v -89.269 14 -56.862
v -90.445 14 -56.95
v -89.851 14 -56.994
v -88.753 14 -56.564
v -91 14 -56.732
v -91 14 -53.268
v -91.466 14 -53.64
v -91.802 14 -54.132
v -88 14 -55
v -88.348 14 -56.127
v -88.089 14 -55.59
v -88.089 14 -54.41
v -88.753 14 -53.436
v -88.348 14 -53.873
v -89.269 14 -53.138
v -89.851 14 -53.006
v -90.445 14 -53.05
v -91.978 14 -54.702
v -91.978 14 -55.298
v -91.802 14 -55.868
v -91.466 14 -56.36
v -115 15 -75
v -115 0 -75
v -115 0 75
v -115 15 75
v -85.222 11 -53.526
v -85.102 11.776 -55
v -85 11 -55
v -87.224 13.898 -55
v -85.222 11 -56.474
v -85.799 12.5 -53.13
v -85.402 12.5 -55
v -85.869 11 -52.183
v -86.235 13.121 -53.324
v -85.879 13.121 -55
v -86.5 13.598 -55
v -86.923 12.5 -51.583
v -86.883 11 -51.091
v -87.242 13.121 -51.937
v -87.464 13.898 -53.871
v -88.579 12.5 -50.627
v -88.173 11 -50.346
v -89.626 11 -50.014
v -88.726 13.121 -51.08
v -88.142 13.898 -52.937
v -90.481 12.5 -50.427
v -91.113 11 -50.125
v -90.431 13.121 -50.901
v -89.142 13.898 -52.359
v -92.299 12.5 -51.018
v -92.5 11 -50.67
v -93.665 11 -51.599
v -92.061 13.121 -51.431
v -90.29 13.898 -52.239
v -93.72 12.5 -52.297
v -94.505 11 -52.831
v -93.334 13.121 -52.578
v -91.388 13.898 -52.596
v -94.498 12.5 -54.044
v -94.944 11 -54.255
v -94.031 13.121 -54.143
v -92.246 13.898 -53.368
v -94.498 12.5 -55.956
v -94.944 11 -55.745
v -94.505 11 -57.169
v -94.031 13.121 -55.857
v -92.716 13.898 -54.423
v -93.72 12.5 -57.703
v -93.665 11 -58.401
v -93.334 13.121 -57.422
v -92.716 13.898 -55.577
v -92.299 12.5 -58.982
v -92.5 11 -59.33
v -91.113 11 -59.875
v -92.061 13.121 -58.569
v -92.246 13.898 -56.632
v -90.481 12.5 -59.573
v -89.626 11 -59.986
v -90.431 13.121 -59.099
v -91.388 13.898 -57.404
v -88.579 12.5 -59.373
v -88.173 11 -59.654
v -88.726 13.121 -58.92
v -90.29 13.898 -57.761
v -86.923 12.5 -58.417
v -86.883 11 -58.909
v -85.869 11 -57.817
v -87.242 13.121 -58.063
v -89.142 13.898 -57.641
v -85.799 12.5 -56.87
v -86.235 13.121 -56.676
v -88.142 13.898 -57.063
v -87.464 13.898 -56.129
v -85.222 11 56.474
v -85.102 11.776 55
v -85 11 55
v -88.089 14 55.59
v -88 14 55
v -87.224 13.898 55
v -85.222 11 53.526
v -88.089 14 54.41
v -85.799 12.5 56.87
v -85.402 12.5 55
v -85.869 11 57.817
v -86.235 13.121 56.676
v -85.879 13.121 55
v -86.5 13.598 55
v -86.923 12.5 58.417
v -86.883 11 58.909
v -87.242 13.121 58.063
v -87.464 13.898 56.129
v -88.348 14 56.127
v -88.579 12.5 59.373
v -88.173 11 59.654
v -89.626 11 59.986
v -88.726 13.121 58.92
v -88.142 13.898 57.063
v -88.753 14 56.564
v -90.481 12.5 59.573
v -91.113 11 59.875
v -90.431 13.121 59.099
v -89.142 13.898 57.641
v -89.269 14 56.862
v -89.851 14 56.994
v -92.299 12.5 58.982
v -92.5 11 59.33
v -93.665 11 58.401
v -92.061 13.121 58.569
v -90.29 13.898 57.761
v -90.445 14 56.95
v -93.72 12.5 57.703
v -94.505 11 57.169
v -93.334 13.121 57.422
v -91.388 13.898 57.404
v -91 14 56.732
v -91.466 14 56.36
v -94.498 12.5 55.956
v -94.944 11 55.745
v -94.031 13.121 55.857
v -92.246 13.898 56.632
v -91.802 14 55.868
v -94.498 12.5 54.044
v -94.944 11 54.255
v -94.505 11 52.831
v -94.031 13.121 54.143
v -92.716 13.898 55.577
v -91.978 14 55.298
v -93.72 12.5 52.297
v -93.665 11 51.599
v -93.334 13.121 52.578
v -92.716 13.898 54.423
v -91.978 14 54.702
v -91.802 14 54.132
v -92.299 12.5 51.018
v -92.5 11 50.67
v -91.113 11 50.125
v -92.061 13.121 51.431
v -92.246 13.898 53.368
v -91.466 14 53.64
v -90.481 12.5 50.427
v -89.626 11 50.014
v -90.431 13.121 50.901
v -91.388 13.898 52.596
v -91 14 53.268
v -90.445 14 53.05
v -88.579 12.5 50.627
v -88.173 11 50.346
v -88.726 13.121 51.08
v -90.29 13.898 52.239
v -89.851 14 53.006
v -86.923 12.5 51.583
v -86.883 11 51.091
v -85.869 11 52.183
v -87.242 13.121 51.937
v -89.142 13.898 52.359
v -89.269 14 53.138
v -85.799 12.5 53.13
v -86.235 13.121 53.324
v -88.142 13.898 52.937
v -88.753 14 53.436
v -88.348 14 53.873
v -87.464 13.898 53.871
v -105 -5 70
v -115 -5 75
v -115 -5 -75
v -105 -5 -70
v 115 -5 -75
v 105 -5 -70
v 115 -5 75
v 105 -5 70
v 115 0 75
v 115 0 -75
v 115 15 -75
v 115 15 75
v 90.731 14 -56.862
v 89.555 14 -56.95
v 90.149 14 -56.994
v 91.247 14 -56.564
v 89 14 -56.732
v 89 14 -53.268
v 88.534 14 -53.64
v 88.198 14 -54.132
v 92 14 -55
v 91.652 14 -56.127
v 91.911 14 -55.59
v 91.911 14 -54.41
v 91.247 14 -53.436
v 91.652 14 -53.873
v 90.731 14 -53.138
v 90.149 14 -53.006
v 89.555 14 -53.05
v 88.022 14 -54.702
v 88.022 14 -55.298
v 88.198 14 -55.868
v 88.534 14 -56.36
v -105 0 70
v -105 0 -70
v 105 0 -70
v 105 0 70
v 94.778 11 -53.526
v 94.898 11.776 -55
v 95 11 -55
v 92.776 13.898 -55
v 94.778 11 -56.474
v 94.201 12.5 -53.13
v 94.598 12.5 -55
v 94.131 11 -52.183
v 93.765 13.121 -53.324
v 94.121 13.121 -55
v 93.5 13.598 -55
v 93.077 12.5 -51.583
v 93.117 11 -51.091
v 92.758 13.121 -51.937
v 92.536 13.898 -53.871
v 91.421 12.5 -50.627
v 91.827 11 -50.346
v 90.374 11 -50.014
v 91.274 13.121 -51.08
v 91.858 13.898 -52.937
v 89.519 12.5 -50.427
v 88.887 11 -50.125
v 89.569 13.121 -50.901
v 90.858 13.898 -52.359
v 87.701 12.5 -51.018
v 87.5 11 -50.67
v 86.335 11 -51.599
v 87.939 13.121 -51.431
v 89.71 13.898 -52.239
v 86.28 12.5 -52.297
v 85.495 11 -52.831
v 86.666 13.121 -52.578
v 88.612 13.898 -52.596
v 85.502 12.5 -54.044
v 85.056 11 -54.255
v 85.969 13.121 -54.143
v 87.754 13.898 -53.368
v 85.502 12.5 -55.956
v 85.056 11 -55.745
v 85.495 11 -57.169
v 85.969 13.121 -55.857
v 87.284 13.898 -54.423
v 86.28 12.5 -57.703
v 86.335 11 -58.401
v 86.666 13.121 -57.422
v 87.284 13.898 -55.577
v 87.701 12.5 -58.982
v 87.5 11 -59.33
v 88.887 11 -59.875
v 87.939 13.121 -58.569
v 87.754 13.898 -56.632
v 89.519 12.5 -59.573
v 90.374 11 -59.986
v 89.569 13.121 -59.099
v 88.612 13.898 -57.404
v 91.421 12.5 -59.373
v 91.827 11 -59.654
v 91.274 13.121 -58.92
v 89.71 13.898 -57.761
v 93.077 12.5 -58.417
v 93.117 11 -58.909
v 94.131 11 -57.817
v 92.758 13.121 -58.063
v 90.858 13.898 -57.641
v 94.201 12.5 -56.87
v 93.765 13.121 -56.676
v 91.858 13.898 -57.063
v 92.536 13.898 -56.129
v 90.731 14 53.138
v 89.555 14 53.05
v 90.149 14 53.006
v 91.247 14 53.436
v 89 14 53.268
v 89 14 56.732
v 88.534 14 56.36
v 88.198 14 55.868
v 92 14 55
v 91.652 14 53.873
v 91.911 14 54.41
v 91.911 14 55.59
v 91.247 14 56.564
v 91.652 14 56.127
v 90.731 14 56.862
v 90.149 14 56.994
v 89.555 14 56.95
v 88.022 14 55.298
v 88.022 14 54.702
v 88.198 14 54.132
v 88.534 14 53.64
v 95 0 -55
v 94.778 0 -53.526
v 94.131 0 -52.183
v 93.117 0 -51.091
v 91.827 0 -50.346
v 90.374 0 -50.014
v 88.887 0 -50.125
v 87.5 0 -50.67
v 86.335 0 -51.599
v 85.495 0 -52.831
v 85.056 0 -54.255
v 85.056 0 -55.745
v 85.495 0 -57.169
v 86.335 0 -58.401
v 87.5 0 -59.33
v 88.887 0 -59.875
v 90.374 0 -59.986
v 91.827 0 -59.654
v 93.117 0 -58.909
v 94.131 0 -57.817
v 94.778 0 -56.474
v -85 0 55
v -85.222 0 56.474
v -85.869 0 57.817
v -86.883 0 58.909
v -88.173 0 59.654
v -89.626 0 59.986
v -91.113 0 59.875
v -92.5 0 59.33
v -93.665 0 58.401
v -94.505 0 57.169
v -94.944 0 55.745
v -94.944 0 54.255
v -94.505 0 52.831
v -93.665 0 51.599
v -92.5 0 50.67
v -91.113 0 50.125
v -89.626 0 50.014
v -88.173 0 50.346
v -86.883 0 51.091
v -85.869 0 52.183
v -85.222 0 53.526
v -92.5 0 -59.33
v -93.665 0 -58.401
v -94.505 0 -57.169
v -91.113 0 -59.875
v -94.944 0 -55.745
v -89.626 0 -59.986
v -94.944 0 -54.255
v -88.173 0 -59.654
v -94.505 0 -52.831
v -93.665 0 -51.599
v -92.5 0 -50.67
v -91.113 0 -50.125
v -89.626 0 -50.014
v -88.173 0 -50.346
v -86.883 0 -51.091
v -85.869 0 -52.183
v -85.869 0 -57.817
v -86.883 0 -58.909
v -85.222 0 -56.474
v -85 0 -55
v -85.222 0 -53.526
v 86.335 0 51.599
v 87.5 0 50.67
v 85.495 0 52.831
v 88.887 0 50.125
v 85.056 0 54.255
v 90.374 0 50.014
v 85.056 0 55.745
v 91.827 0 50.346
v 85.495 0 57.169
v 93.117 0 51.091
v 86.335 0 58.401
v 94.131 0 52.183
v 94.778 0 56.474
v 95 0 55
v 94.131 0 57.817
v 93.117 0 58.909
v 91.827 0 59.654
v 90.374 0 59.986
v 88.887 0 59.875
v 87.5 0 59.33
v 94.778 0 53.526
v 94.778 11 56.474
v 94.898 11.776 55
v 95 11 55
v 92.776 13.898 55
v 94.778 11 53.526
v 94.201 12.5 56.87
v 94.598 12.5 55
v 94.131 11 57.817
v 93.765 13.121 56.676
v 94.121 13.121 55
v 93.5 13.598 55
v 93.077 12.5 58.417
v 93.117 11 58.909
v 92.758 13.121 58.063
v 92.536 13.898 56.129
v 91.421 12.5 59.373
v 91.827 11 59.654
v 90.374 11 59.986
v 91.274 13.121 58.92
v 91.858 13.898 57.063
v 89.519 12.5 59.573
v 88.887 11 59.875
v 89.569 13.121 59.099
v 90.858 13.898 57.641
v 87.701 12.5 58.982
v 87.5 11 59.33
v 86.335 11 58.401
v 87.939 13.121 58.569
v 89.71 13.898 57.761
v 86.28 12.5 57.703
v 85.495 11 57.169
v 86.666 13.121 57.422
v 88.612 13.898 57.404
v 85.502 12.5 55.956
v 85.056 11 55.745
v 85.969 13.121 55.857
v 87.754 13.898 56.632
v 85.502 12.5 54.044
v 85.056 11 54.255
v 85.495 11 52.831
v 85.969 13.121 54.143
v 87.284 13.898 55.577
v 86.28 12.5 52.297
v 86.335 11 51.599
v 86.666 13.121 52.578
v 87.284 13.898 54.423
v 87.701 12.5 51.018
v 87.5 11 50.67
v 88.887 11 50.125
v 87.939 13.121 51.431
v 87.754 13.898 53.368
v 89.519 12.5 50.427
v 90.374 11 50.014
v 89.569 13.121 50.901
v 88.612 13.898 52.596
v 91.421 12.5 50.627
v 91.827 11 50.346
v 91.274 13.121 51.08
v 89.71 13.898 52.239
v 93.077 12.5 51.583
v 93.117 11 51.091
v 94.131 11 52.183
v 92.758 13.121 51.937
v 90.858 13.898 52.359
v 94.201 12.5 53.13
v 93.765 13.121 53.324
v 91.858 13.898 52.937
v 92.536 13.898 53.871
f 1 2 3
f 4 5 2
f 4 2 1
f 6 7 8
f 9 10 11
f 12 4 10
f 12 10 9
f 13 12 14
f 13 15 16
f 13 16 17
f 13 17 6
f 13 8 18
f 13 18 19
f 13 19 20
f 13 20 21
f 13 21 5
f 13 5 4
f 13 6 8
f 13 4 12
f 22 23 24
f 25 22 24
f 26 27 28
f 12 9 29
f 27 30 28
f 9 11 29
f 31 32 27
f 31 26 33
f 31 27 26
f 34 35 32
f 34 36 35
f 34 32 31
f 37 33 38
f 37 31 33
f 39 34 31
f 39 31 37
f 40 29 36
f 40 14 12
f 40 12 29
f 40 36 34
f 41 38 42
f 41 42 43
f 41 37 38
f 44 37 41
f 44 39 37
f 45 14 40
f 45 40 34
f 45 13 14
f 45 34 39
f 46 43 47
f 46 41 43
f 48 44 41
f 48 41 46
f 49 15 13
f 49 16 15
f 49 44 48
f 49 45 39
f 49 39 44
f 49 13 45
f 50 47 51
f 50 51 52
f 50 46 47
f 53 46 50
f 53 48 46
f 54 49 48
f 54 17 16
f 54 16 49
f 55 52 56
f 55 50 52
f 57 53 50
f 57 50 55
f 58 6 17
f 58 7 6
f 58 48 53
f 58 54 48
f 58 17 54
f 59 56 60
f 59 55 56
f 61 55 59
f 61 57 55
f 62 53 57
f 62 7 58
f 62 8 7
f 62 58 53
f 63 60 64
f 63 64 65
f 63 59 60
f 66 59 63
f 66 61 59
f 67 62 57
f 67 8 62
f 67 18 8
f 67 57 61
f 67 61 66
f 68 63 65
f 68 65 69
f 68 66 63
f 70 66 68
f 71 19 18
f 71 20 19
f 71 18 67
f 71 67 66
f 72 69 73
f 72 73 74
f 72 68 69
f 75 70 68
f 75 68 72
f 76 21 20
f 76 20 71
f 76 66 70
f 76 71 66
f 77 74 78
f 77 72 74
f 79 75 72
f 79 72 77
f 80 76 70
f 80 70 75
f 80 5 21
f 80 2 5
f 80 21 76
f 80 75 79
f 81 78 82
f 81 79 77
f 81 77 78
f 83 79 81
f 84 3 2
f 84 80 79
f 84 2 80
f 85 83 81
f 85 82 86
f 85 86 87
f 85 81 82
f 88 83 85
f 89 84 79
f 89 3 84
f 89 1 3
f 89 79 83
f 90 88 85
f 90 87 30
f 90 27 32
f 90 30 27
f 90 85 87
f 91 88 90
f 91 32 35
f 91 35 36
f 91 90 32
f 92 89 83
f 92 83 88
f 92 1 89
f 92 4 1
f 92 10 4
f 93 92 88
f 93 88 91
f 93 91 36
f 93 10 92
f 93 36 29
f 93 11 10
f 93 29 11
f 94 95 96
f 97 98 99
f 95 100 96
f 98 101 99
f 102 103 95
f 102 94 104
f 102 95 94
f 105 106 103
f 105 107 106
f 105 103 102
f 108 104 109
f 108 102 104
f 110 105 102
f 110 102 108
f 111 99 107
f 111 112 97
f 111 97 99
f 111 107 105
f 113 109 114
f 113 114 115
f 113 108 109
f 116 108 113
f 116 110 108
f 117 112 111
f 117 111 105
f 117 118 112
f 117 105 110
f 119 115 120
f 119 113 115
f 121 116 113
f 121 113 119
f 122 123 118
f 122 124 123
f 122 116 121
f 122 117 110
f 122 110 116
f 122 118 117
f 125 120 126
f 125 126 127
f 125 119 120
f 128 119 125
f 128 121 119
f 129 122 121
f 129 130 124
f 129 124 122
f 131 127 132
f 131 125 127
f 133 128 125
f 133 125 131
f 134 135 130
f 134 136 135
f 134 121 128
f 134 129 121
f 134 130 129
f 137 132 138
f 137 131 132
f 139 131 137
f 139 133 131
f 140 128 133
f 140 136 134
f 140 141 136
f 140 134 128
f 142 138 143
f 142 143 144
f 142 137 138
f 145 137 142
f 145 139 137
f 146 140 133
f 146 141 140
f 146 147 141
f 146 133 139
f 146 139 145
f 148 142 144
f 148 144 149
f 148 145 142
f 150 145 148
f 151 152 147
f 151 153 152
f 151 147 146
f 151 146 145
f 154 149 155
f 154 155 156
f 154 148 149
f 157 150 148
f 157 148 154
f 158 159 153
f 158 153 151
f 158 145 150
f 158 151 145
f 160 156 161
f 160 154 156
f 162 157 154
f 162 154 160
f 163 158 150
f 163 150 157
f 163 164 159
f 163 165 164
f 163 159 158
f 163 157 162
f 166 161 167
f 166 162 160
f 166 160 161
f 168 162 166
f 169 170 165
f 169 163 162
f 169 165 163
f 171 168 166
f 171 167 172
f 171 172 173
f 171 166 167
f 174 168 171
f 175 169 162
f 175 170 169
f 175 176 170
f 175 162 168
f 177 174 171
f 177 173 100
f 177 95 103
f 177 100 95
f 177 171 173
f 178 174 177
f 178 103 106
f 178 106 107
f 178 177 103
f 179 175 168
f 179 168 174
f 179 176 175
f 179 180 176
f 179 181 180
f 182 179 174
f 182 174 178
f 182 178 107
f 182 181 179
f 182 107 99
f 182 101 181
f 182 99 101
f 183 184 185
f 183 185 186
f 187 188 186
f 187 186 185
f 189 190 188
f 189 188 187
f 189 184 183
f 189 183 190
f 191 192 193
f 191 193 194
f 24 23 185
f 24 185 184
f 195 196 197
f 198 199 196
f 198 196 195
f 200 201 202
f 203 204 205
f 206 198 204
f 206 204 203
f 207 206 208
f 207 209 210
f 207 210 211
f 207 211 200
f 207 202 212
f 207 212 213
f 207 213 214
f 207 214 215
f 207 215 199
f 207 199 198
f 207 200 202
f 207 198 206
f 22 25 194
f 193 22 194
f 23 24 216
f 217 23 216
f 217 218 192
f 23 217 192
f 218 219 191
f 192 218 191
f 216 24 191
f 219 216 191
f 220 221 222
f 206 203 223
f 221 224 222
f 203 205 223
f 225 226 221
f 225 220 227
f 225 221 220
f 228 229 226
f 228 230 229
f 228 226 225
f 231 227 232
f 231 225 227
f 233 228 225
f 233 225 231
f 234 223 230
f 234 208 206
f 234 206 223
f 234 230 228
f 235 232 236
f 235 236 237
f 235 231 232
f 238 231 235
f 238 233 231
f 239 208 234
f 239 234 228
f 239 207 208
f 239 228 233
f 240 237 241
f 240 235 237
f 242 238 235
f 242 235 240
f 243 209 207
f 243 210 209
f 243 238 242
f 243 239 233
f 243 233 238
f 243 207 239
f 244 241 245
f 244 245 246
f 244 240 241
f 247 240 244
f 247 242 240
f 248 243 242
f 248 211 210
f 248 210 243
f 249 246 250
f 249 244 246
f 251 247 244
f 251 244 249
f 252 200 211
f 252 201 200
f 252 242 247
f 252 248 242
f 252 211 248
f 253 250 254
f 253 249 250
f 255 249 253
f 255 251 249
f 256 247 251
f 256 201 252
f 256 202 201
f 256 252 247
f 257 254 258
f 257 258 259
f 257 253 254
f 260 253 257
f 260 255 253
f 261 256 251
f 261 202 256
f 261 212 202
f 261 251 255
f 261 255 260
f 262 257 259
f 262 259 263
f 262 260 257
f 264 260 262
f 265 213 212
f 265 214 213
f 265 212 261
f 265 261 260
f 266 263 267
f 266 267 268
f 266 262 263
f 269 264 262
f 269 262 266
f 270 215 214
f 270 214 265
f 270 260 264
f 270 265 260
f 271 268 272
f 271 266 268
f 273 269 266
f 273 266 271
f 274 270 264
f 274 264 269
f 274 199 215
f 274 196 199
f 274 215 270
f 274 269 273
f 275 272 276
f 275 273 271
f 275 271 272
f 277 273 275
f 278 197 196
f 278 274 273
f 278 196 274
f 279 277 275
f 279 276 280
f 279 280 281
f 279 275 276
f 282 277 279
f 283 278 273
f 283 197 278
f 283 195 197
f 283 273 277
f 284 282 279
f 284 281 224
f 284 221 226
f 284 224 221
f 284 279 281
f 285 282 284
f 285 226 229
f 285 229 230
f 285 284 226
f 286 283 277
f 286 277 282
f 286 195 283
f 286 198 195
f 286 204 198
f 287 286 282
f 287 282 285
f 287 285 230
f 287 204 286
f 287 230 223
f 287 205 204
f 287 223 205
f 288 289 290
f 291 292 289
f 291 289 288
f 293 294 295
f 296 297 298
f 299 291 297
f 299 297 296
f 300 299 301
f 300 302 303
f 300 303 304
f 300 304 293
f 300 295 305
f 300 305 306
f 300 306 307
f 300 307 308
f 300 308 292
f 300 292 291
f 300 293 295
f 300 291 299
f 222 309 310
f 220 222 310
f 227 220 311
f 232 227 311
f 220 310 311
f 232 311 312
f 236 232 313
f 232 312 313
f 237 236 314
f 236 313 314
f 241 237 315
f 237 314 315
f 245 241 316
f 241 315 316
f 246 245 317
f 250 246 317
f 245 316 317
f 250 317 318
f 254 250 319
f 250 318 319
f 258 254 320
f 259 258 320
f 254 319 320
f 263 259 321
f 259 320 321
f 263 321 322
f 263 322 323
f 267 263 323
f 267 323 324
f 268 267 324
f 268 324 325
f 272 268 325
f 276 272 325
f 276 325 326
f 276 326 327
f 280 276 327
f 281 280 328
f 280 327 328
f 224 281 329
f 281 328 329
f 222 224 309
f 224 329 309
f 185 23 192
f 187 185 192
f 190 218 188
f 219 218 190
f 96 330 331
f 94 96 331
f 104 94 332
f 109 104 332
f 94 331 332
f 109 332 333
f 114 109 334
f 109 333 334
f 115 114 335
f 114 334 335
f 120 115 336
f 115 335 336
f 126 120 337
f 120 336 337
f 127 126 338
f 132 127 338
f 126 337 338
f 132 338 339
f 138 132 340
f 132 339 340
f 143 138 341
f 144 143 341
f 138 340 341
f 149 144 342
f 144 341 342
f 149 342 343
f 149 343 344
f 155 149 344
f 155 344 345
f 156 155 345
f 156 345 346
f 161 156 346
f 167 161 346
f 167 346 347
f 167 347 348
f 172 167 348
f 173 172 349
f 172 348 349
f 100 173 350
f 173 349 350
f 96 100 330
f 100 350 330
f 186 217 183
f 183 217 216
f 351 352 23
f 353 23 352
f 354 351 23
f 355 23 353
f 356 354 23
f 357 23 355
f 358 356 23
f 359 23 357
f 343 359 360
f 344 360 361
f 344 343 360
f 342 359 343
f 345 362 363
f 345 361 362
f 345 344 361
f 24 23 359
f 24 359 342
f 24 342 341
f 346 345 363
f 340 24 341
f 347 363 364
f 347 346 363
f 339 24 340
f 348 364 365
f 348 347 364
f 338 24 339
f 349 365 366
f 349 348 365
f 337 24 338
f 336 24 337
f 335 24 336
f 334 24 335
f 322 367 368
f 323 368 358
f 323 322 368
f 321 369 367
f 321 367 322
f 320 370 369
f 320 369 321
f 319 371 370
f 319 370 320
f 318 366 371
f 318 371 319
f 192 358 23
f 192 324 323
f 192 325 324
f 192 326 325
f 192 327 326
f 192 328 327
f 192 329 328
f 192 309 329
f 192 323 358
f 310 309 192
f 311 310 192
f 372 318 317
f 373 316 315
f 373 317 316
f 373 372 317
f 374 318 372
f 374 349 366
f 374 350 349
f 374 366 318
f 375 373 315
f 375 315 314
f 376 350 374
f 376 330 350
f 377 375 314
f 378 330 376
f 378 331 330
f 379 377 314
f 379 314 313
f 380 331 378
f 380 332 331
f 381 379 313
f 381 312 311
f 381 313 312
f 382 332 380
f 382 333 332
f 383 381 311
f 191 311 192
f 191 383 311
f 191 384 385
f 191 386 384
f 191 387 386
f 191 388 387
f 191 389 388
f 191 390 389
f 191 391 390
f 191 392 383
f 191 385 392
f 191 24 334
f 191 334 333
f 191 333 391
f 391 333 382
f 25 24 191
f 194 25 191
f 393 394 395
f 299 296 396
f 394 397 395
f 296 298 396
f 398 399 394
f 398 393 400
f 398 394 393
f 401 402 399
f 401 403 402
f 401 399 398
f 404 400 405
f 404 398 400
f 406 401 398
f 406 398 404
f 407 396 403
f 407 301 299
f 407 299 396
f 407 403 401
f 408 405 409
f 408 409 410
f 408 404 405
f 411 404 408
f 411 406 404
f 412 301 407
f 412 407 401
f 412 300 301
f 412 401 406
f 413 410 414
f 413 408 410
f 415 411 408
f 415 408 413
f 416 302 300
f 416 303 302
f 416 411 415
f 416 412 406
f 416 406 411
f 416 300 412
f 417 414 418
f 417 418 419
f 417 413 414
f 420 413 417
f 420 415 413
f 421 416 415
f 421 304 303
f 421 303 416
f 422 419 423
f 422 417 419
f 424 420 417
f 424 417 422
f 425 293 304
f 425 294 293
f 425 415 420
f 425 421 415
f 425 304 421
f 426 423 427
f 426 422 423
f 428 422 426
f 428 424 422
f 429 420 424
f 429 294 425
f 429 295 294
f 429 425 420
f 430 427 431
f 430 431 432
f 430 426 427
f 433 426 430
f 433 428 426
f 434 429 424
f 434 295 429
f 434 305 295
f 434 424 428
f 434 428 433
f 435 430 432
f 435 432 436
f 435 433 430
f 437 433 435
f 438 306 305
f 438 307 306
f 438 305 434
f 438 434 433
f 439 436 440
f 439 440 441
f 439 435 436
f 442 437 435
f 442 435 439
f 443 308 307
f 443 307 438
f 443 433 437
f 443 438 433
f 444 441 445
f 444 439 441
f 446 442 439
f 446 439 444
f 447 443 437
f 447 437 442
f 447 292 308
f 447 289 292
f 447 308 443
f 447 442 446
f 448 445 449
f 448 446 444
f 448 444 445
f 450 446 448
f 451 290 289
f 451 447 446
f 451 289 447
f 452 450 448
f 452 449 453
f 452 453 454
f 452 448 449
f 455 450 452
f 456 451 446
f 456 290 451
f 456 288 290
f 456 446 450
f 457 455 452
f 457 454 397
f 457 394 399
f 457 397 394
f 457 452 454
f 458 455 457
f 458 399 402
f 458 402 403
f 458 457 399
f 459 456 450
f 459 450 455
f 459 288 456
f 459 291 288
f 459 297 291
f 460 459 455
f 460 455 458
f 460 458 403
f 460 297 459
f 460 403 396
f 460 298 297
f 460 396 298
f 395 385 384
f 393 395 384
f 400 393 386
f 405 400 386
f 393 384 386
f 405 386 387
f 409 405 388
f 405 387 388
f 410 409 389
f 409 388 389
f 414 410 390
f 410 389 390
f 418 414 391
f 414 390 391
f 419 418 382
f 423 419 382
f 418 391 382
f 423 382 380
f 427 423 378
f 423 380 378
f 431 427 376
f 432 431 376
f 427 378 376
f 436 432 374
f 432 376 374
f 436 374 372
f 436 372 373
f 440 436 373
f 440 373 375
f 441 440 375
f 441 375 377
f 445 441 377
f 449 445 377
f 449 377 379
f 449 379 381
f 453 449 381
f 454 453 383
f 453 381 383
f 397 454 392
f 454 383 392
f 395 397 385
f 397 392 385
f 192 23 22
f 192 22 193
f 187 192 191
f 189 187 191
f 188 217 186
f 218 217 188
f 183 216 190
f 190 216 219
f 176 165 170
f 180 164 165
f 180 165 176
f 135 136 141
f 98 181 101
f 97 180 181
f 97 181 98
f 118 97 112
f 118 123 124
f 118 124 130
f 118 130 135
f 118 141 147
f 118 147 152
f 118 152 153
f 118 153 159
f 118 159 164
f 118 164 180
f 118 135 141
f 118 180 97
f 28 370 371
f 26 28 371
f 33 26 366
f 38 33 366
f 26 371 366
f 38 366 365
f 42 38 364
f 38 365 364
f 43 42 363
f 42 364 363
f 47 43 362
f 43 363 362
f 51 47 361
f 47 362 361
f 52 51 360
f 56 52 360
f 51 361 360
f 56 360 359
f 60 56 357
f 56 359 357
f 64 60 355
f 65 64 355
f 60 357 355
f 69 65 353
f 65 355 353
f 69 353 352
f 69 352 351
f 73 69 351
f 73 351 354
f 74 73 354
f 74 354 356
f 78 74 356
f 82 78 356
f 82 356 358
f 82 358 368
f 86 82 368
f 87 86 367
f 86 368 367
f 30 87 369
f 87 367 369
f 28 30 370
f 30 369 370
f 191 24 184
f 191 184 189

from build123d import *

# Parameters (mm, degrees)
F0_W     = 230
F0_H     = 150
F0_W_2   = 210
F0_H_2   = 140
F1_DEPTH = 5
F0_R     = 5
F2_DEPTH = 15
F3_DEPTH = 14
F4_R     = 3


with BuildPart() as f1:
    # F0 (on Front) → F1 (new body)
    with BuildSketch(Plane.XZ):
        Rectangle(F0_W, F0_H)
        Rectangle(F0_W_2, F0_H_2, mode=Mode.SUBTRACT)
    extrude(amount=F1_DEPTH)


with BuildPart() as f2:
    # F0 (on Front) → F2 (new body)
    with BuildSketch(Plane.XZ):
        Rectangle(F0_W, F0_H)
        Rectangle(F0_W_2, F0_H_2, mode=Mode.SUBTRACT)
        Rectangle(F0_W_2, F0_H_2)
        with Locations((-90, -55)):
            Circle(F0_R, mode=Mode.SUBTRACT)
        with Locations((90, -55)):
            Circle(F0_R, mode=Mode.SUBTRACT)
        with Locations((-90, 55)):
            Circle(F0_R, mode=Mode.SUBTRACT)
        with Locations((90, 55)):
            Circle(F0_R, mode=Mode.SUBTRACT)
        with Locations((-90, 55)):
            Circle(F0_R)
        with Locations((-90, -55)):
            Circle(F0_R)
        with Locations((90, -55)):
            Circle(F0_R)
        with Locations((90, 55)):
            Circle(F0_R)
    extrude(amount=-F2_DEPTH)

    # F0 (on Front) → F3 (cut)
    with BuildSketch(Plane.XZ):
        with Locations((-90, 55)):
            Circle(F0_R)
        with Locations((-90, -55)):
            Circle(F0_R)
        with Locations((90, -55)):
            Circle(F0_R)
        with Locations((90, 55)):
            Circle(F0_R)
    extrude(amount=-F3_DEPTH, mode=Mode.SUBTRACT)

    # F4
    f4_edges = [f2.edges().sort_by_distance(p)[0] for p in [
        (-95, 14, 55),
        (-95, 14, -55),
        (85, 14, -55),
        (85, 14, 55),
    ]]
    fillet(f4_edges, radius=F4_R)


solid = Compound([f1.part, f2.part])
